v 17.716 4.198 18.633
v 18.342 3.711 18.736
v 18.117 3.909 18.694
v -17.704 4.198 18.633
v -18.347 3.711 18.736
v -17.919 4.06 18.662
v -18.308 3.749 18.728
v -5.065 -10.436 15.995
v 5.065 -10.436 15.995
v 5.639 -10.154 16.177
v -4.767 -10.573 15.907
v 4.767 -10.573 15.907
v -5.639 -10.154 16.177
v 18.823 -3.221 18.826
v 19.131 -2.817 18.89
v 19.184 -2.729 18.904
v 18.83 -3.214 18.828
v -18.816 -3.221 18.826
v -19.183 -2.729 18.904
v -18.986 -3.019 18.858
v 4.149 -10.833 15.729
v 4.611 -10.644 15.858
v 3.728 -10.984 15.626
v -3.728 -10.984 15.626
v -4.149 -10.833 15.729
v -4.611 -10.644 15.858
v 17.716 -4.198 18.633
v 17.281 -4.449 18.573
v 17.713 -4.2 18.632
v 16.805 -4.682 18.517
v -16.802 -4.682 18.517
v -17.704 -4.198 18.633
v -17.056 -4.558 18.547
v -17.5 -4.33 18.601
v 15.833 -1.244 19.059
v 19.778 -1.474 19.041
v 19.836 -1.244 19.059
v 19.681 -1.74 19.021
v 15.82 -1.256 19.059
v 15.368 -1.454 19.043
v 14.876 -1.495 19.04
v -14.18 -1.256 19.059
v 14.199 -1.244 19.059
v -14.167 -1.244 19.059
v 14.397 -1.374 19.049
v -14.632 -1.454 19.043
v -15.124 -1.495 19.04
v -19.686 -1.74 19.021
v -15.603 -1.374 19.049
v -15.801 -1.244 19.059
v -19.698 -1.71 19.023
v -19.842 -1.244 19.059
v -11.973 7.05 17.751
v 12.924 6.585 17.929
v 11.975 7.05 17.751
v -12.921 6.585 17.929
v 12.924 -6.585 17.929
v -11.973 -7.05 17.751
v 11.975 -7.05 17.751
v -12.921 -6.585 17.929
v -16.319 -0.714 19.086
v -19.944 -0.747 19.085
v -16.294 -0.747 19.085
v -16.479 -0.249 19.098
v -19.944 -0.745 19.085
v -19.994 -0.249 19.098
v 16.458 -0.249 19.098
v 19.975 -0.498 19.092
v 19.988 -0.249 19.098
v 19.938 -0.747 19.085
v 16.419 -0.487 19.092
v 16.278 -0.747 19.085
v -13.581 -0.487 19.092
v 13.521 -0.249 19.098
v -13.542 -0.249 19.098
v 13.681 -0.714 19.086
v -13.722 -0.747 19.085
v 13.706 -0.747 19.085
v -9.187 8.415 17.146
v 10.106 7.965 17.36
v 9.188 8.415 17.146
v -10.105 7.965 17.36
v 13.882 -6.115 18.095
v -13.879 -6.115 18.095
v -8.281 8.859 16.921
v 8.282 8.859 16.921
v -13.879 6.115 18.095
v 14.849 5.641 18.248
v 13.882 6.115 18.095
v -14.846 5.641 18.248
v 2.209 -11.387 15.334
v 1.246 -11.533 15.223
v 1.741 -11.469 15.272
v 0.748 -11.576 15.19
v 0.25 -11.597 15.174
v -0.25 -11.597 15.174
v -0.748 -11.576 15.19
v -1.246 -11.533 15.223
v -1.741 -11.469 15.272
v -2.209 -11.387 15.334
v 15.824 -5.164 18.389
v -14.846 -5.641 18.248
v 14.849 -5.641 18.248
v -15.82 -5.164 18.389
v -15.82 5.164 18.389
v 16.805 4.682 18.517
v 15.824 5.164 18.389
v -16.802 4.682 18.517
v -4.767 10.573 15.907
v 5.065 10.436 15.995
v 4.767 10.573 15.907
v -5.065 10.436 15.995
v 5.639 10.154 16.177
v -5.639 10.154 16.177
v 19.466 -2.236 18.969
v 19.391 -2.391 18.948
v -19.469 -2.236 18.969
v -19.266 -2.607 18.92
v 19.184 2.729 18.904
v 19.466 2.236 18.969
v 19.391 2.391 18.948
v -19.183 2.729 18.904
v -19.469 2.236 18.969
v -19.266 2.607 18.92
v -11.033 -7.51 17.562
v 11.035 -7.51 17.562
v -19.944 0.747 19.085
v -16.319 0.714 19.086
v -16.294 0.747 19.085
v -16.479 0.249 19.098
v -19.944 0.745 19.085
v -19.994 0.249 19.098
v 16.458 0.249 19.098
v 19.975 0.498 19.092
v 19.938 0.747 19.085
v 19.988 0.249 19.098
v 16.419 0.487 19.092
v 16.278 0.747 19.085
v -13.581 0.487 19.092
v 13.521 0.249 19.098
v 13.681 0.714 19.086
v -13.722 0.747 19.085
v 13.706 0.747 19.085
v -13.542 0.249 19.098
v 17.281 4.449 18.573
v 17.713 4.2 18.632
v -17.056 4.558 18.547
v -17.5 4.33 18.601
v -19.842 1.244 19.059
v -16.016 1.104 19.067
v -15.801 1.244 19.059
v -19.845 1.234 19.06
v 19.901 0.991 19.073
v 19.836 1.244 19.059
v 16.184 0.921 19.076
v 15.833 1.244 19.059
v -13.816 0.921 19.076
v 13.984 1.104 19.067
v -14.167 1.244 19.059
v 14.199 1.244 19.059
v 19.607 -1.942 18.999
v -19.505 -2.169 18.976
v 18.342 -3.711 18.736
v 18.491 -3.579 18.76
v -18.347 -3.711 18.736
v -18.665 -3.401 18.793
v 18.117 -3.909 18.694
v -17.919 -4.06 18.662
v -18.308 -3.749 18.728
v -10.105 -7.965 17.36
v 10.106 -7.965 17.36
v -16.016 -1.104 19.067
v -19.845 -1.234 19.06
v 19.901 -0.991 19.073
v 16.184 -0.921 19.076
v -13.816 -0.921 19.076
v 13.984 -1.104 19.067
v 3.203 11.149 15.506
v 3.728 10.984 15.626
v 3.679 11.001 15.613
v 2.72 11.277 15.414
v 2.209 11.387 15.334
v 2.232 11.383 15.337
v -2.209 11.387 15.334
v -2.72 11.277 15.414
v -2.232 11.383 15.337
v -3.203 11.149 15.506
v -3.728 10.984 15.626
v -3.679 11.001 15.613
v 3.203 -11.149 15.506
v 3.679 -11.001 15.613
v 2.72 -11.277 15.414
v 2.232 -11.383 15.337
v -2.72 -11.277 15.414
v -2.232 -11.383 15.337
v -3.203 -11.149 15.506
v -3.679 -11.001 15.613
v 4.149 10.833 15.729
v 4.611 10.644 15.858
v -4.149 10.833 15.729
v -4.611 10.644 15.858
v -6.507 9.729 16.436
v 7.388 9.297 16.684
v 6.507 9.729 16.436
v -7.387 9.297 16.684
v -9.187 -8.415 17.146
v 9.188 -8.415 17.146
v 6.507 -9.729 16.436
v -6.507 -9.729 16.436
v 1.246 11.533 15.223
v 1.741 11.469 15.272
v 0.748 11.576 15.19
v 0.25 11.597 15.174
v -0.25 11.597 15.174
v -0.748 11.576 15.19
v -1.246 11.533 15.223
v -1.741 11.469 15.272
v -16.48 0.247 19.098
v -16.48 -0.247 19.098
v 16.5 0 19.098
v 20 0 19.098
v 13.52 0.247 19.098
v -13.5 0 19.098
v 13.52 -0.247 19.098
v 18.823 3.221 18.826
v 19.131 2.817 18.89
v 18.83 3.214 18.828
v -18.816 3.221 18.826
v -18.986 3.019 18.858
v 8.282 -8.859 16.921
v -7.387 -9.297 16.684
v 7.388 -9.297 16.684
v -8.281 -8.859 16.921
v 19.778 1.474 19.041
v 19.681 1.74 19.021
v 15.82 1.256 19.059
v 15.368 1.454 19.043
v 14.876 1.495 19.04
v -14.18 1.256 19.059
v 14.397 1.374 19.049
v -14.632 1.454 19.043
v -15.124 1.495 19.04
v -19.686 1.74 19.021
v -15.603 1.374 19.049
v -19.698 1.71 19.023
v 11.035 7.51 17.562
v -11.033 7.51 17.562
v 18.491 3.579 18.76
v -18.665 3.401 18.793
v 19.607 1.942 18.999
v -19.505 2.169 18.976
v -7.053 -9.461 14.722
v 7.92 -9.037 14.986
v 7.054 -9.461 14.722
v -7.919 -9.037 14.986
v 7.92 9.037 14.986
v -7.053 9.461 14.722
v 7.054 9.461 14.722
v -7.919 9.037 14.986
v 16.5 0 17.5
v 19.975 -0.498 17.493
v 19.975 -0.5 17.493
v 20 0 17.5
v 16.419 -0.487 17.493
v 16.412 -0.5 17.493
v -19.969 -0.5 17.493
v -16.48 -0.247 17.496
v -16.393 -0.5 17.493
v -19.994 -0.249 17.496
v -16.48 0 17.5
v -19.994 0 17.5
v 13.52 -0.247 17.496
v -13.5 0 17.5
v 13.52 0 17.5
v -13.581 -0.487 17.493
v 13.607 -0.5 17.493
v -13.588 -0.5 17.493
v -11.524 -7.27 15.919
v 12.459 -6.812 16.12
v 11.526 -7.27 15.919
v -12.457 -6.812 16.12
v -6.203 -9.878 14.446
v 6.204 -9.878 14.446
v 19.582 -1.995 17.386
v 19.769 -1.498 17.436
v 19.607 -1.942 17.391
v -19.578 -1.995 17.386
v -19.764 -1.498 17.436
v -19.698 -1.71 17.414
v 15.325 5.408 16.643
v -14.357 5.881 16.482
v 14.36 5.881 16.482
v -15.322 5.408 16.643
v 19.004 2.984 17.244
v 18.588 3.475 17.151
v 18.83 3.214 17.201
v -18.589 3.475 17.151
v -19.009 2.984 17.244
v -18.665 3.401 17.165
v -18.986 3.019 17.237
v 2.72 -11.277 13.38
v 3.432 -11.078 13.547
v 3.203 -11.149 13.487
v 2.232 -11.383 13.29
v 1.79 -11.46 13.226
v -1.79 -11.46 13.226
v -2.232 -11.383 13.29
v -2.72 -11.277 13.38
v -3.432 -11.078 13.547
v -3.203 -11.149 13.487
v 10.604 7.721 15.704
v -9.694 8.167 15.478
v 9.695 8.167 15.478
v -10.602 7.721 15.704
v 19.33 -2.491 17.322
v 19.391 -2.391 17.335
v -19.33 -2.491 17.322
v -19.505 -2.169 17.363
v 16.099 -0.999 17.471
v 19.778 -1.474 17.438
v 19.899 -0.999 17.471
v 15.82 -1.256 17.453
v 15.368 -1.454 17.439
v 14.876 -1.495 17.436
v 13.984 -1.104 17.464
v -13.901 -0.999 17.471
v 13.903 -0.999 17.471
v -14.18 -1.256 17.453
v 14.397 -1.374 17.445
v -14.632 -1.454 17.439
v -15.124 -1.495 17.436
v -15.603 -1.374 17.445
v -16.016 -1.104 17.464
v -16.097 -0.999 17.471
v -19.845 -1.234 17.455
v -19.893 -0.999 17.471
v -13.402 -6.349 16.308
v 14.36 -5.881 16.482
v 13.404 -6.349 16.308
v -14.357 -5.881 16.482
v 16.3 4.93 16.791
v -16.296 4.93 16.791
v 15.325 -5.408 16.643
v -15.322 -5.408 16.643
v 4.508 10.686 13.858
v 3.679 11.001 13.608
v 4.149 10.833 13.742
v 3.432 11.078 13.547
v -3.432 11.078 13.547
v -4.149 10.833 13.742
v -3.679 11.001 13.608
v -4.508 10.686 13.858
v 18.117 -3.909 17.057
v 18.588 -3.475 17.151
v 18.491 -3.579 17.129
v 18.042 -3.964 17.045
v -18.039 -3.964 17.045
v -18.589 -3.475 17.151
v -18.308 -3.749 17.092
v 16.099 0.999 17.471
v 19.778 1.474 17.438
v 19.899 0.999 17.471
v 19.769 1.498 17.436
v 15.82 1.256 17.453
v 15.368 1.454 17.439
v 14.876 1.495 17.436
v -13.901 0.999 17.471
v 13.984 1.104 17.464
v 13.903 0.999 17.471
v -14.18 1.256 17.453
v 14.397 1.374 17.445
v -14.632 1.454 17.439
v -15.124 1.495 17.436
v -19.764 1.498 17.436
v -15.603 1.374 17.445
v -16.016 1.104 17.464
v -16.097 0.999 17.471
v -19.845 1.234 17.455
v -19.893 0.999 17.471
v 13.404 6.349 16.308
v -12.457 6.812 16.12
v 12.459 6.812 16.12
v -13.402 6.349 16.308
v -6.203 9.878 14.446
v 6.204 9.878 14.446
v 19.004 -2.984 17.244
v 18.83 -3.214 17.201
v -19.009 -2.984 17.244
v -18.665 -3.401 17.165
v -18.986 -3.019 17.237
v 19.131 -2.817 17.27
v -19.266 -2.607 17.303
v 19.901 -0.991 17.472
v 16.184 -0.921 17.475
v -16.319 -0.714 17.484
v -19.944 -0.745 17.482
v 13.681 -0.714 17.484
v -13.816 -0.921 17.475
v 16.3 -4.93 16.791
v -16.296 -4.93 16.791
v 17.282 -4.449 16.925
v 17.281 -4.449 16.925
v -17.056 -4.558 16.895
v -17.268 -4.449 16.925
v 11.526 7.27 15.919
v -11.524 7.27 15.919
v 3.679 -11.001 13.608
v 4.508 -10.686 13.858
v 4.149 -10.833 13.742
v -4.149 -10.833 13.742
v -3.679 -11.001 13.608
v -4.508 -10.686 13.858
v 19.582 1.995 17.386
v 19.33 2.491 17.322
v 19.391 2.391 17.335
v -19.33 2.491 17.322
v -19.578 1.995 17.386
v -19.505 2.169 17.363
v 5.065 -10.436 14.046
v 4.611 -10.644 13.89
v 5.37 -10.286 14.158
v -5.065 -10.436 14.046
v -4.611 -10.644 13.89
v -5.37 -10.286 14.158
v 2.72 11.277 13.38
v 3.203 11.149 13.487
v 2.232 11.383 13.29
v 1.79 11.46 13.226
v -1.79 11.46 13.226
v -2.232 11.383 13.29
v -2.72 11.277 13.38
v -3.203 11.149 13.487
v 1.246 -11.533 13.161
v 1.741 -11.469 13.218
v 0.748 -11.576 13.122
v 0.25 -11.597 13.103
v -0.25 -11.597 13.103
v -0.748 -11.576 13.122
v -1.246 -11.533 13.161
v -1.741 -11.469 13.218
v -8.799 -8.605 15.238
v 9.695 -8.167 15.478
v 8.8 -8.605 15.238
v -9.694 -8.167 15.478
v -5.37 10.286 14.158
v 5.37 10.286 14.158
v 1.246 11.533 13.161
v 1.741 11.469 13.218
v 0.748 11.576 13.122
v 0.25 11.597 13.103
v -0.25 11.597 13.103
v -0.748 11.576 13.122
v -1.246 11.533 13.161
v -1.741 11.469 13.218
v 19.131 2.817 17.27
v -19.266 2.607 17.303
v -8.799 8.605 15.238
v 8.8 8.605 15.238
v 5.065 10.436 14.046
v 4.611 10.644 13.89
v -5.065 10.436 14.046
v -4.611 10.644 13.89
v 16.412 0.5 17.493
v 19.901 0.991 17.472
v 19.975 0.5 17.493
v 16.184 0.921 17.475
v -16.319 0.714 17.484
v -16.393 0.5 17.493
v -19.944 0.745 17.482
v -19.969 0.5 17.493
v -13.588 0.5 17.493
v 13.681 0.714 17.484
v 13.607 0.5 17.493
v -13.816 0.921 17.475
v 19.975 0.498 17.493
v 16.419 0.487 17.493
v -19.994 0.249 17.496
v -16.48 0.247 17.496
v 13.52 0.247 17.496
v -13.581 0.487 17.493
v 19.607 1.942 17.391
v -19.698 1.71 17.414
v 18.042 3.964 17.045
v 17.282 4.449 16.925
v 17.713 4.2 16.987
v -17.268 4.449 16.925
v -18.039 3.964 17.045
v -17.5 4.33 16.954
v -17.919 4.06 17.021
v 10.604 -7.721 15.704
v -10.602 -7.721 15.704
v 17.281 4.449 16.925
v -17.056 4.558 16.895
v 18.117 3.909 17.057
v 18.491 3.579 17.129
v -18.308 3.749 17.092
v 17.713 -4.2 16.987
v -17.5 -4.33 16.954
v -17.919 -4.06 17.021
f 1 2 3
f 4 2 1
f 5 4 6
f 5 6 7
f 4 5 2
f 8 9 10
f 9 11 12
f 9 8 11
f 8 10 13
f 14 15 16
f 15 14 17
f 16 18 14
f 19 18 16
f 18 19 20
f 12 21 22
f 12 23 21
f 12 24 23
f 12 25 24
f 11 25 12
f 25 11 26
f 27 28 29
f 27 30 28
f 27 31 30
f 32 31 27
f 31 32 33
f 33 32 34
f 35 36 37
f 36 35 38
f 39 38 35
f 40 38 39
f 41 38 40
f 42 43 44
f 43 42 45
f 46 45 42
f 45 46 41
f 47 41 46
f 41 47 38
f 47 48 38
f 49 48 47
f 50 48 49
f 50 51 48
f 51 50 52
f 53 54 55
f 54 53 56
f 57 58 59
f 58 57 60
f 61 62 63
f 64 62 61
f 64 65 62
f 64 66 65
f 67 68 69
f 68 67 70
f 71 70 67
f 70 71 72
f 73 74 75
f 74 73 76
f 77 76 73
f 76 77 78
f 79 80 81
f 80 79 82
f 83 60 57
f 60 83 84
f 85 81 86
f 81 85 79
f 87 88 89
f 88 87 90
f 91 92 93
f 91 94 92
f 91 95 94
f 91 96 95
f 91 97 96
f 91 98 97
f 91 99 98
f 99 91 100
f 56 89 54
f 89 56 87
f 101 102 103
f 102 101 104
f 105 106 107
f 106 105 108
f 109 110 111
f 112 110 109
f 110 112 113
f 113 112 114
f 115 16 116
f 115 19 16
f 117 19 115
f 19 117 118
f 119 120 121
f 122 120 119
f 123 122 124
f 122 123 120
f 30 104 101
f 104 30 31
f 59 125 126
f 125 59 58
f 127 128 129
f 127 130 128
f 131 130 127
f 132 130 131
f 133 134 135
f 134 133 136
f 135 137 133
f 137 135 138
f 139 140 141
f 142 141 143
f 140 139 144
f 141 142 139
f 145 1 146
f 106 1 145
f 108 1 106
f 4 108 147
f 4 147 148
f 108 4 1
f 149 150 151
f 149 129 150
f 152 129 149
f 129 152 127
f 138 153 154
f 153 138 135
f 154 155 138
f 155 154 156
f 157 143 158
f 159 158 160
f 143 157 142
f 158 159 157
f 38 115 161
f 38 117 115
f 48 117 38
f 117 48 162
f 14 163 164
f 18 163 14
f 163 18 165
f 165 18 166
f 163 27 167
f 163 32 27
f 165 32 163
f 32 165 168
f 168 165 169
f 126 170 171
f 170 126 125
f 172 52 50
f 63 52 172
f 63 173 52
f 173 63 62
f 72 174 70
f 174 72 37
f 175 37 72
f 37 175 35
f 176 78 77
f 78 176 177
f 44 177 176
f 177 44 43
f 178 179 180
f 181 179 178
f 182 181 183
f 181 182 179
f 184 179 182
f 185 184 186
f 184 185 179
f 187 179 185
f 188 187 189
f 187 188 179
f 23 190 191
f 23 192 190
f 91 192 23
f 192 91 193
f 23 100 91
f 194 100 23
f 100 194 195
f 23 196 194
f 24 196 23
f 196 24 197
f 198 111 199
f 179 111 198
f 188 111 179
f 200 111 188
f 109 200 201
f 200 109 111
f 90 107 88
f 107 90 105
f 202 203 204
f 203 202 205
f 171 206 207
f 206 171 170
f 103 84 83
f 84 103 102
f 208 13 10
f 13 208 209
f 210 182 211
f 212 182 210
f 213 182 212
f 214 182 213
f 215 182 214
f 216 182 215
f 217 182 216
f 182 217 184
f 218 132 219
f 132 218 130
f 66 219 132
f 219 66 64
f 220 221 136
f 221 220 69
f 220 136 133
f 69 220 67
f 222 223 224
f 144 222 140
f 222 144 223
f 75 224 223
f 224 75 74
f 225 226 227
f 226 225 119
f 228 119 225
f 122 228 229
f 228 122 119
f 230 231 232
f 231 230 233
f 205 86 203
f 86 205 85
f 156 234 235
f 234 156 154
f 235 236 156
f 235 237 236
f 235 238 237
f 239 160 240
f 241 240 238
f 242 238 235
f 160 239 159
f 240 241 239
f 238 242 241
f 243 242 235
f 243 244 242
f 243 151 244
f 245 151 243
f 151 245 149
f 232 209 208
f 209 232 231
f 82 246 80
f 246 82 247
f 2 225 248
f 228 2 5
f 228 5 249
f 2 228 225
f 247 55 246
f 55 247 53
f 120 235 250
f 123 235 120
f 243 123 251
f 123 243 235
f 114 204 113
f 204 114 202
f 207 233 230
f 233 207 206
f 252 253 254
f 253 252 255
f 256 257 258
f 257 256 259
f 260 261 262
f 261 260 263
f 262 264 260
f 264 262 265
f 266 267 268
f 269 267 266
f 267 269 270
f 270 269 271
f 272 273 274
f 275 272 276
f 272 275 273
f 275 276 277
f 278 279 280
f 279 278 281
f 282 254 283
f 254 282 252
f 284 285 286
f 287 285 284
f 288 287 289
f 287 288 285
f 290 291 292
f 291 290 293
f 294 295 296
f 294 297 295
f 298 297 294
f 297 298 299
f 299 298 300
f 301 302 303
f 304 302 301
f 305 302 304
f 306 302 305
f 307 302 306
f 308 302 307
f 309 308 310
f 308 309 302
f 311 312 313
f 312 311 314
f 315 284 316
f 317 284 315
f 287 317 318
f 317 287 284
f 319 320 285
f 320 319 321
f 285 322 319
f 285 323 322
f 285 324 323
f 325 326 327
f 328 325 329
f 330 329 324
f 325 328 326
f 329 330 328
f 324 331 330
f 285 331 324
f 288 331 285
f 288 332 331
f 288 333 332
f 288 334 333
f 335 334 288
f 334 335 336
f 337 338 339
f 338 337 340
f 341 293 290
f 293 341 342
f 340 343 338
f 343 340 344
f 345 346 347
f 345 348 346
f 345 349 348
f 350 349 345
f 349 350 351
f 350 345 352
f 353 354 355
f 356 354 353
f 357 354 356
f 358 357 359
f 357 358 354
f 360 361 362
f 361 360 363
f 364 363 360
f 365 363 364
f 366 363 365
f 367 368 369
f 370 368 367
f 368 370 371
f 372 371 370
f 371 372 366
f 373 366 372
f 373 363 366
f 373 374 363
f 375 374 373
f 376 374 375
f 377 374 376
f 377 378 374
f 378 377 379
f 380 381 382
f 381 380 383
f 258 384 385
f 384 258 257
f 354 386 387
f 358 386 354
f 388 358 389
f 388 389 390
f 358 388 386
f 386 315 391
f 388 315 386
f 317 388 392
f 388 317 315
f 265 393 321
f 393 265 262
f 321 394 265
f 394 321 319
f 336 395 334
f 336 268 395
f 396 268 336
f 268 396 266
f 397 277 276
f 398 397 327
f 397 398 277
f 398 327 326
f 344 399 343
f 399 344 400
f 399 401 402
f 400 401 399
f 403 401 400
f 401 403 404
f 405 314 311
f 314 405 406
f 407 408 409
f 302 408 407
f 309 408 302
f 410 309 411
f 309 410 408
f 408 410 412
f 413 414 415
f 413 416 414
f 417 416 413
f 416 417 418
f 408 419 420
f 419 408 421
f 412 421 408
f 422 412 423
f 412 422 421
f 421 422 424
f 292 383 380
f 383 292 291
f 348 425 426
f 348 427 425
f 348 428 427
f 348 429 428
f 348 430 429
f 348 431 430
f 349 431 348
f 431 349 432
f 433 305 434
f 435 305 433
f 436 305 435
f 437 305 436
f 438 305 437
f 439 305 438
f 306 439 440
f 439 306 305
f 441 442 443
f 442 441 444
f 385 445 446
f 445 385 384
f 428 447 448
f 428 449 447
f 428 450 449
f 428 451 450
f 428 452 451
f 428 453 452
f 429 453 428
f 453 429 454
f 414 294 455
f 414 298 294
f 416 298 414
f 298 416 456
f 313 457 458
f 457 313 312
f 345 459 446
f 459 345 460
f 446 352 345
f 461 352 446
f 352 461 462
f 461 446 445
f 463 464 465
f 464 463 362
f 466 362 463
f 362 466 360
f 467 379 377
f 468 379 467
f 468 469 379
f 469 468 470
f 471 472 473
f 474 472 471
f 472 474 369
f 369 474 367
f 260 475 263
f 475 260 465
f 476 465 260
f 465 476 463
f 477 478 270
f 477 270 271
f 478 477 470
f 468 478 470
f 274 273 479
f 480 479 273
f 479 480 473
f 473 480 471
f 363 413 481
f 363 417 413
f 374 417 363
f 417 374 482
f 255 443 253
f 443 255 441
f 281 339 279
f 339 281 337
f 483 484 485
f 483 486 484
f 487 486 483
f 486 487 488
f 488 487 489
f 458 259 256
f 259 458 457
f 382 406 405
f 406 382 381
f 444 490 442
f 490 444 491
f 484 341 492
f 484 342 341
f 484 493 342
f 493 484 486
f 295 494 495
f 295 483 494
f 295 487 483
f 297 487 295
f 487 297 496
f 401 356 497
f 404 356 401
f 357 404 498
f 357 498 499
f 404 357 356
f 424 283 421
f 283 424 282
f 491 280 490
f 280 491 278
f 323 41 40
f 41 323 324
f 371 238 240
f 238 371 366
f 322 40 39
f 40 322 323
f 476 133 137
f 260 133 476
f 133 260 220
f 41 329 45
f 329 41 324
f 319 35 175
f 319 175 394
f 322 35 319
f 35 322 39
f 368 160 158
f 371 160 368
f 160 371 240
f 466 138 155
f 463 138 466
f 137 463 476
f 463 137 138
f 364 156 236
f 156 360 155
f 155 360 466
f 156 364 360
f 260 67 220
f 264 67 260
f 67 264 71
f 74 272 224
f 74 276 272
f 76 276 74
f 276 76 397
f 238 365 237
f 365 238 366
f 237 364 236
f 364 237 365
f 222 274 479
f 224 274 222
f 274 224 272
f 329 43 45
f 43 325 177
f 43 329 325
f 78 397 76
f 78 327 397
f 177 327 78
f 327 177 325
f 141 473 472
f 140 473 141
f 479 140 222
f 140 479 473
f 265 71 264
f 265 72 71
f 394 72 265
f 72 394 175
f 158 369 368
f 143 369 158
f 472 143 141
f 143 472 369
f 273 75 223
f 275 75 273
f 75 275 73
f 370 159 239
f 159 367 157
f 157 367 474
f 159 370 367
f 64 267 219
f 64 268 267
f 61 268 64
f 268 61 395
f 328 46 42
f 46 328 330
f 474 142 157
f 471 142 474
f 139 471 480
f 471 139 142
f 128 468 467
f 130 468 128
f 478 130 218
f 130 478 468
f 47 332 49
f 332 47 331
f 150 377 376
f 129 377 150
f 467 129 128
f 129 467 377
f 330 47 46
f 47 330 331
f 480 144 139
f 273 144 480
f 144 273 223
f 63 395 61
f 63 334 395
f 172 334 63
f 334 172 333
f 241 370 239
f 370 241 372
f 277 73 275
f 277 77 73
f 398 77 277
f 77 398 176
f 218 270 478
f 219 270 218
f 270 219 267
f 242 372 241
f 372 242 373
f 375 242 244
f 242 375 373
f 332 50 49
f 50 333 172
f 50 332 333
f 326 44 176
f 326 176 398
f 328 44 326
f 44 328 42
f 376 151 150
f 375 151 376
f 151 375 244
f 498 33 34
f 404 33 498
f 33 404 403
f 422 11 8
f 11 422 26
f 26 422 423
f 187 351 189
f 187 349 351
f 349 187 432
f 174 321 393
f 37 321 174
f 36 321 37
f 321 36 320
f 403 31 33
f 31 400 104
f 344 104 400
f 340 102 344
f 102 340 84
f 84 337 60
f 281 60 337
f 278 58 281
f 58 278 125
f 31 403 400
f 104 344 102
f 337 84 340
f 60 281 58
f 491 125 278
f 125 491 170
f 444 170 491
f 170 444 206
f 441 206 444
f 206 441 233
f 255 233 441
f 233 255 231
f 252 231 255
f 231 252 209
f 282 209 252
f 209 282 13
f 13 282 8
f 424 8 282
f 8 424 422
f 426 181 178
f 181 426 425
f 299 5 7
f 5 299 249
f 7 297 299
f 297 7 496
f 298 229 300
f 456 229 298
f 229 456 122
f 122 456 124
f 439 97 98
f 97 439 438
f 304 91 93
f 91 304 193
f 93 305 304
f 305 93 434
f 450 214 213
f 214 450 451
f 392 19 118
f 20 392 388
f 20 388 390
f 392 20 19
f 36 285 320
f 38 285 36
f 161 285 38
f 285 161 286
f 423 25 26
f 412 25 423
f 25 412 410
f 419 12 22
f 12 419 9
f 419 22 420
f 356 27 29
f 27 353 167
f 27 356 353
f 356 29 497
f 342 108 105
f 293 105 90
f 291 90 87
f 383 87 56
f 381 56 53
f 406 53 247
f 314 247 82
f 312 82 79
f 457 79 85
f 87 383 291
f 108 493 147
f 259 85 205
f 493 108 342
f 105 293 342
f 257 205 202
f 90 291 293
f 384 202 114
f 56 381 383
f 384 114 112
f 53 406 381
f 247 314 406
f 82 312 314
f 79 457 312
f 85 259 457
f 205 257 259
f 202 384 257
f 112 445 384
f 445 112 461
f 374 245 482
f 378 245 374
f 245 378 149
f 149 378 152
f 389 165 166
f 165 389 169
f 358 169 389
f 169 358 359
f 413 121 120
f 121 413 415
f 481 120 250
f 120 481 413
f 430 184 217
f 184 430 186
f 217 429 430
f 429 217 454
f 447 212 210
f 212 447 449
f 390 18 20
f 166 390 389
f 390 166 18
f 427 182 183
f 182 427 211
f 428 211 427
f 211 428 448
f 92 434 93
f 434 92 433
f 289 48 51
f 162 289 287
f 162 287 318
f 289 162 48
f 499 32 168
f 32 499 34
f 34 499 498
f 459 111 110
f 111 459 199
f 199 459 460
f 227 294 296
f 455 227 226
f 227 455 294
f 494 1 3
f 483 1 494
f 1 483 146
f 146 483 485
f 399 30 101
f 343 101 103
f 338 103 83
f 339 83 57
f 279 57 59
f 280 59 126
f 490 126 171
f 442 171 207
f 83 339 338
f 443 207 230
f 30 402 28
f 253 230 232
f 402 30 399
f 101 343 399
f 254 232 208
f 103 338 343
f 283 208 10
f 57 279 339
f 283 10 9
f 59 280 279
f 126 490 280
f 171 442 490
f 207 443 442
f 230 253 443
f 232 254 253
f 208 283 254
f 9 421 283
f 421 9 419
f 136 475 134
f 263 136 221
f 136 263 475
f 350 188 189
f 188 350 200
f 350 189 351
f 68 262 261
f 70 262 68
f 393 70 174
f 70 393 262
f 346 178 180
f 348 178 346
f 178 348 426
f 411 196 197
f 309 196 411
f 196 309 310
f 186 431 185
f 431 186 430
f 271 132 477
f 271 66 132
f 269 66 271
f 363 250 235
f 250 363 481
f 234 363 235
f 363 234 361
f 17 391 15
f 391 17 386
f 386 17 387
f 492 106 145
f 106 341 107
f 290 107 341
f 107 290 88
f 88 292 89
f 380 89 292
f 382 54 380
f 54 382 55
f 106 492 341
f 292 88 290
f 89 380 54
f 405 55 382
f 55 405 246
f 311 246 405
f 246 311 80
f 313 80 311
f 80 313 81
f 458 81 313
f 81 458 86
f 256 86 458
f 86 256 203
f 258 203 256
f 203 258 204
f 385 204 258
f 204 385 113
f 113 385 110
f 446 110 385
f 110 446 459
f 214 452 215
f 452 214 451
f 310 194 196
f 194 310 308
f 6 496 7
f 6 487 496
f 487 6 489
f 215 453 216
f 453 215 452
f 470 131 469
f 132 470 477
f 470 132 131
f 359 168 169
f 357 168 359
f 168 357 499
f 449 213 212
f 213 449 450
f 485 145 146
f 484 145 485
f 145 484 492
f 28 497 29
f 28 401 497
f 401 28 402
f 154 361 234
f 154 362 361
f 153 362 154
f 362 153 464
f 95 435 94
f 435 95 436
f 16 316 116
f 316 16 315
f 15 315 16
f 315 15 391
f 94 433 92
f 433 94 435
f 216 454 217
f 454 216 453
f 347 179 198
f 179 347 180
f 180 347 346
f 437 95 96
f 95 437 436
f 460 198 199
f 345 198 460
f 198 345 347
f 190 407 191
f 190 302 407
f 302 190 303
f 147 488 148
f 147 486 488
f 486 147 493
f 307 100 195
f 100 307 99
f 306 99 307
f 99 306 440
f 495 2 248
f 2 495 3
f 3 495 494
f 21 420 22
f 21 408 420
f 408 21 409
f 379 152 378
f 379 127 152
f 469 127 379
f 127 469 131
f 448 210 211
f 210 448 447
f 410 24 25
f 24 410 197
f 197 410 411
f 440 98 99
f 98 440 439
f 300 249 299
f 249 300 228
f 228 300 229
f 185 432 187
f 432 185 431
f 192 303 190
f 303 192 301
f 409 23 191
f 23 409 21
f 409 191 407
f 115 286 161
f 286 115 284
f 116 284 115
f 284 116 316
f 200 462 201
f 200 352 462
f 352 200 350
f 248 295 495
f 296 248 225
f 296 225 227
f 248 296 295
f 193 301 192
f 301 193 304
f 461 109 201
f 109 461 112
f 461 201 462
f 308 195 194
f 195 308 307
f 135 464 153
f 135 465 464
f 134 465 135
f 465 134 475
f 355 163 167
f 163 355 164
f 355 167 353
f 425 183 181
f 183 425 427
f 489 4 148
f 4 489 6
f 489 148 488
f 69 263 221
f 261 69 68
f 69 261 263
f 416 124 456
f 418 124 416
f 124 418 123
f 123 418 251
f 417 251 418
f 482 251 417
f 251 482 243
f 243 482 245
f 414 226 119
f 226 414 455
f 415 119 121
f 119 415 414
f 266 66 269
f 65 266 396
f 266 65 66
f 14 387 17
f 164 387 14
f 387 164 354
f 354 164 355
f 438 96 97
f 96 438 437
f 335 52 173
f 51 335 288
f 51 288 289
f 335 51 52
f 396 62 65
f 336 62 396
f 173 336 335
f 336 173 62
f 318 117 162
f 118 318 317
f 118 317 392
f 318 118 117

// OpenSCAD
$fa=1/2;
$fs=1/2;
shovel_d=35;
screws_dist=30;
mount_hole=3;
extra=5;
center_hole=6;
total_height=21;
od=18;
wall=1.6;
air=1;
bissl=1/100;

module surface_mount() {
  intersection() {
    rotate([0,90,0])difference() {
      cylinder(d=shovel_d+2*wall,h=screws_dist+2*extra,center=true);
      cylinder(d=shovel_d,h=screws_dist+2*extra+bissl,center=true);
      translate([(shovel_d+2*wall)/2,0,0]) cube([shovel_d+2*wall,shovel_d+2*wall,screws_dist+2*extra+bissl],center=true);
      rotate([0,-90,0])translate([screws_dist/2,0,0])cylinder(d=mount_hole,h=shovel_d);
      rotate([0,-90,0])translate([-screws_dist/2,0,0])cylinder(d=mount_hole,h=shovel_d);
    }
    hull() {
      cylinder(d=od+2*wall+2*air,h=shovel_d);
      translate([screws_dist/2,0,0])cylinder(d=2*extra,h=shovel_d);
      translate([-screws_dist/2,0,0])cylinder(d=2*extra,h=shovel_d);
    }
  }
}
surface_mount();
